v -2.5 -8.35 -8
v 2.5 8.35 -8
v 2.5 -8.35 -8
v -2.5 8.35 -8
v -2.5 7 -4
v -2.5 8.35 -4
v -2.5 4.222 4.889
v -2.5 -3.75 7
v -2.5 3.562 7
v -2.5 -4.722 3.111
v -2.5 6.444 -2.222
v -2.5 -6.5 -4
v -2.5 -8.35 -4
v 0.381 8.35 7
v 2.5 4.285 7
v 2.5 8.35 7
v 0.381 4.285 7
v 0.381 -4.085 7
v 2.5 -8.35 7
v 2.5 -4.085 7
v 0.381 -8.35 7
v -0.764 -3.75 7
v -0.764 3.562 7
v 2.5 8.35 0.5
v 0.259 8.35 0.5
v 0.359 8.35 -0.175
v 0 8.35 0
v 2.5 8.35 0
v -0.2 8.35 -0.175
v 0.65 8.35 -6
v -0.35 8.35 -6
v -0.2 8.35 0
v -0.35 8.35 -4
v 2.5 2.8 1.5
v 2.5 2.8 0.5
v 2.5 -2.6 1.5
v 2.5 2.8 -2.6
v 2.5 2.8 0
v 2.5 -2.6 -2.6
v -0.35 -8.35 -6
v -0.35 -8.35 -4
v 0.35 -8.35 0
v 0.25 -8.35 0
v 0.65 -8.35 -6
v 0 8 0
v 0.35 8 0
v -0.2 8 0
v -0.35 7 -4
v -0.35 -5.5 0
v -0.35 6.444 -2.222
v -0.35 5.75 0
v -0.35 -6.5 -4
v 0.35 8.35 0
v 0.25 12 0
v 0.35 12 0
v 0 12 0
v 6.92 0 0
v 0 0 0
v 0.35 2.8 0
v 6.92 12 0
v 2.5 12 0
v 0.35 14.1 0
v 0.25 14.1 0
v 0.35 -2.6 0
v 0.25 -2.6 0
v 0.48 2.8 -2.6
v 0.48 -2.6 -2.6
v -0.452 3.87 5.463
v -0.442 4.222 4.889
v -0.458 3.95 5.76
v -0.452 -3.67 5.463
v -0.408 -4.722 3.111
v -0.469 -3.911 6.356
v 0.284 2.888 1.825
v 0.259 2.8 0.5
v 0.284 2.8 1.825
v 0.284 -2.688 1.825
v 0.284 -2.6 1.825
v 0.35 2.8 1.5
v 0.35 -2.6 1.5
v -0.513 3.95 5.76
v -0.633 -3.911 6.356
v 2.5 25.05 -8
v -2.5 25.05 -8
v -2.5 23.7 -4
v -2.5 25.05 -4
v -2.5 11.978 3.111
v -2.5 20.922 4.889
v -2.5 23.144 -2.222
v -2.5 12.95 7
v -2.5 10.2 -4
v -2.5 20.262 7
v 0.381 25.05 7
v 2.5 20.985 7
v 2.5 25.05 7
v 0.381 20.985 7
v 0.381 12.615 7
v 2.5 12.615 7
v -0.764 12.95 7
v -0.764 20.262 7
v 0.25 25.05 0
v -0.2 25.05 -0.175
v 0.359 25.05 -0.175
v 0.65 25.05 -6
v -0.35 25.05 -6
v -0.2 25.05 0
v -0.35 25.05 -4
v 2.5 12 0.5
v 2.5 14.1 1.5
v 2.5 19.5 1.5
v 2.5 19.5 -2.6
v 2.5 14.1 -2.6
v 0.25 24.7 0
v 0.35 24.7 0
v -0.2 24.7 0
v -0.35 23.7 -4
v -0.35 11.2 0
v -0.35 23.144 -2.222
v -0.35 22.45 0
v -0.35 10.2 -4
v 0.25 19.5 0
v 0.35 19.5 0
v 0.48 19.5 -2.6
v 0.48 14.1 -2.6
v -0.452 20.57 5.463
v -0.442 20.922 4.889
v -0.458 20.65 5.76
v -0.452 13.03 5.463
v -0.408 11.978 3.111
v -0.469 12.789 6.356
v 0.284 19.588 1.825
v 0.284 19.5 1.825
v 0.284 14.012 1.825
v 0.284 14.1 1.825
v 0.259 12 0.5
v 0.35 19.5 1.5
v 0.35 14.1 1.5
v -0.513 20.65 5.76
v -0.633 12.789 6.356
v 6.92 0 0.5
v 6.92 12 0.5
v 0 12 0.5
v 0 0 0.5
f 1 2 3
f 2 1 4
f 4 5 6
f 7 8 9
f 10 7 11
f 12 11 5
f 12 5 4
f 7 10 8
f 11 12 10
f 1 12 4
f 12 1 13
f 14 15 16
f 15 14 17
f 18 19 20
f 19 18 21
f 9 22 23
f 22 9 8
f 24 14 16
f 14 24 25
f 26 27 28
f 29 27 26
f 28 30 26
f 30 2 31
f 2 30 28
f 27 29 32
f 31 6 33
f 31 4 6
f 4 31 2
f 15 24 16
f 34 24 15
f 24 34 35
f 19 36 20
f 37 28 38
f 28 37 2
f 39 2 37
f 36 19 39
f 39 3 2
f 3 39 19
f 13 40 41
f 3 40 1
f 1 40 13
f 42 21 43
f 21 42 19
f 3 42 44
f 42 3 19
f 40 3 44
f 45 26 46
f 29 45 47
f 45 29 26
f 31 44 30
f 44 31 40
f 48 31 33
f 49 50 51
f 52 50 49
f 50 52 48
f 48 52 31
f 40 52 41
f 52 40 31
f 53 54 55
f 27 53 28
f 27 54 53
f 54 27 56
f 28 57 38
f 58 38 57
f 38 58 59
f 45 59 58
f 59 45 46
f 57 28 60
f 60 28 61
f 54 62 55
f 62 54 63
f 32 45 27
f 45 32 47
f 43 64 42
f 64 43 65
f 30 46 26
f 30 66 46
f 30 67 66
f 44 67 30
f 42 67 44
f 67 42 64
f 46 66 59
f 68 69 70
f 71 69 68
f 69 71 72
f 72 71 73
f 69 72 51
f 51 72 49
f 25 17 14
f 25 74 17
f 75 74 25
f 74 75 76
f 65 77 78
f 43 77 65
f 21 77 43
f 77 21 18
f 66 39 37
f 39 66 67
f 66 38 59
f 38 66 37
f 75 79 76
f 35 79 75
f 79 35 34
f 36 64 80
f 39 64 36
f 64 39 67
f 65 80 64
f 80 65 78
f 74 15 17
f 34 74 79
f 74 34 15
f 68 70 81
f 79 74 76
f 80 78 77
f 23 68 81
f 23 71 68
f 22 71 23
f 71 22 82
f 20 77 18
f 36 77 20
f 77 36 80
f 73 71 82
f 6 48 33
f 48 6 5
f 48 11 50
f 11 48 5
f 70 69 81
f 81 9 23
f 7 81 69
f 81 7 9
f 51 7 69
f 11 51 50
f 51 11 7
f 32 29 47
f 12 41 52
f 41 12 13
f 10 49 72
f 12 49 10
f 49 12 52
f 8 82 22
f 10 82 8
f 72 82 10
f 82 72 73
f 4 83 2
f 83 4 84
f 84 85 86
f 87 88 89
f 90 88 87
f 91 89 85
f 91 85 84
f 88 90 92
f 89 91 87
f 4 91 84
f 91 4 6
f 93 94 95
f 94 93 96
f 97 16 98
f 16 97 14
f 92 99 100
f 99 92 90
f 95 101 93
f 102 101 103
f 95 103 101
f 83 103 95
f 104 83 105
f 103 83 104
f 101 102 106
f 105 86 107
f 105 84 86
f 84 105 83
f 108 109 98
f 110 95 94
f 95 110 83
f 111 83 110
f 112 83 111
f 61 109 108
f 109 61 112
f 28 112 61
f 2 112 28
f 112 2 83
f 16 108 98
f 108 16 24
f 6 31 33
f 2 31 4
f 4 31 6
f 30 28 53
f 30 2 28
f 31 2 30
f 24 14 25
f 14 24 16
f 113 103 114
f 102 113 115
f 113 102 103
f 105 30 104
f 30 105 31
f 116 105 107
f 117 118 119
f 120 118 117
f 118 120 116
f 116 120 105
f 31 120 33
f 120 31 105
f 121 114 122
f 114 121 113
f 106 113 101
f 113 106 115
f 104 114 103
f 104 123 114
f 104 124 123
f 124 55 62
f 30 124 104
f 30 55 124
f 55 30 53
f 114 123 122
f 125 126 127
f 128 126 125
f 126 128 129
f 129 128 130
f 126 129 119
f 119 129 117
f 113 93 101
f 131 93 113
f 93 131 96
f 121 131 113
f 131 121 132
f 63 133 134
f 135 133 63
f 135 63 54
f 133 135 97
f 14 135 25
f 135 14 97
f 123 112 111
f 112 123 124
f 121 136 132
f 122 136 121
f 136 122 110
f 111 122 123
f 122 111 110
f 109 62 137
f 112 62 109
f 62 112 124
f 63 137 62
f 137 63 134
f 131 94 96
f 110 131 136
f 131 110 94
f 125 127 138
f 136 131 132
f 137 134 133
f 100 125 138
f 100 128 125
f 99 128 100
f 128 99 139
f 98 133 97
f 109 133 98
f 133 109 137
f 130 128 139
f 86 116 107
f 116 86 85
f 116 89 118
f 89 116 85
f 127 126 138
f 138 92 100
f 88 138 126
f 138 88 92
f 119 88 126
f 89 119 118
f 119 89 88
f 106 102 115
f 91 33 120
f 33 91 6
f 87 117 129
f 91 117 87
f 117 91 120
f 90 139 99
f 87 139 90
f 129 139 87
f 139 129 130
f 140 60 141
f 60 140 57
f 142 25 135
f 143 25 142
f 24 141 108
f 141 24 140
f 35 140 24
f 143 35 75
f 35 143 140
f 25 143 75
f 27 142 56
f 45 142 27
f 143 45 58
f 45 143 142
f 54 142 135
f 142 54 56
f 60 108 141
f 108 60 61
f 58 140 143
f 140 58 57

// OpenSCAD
// file: LedStripLights5b.scad
// Lights5b
// Ferrules for 3 mm fiber optic sideglows

//p1=[ [0,0], [0,4], [0.5,5], [5.75,5], [5.85,4], [9.15,4], [9.25,5], [12,5], [27,3], [27,0] ];
p1=[ [0,0], [0,4], [0.5,6], [5.75,6], [5.85,5], [9.15,5], [9.25,6], [12,6], [27,3], [27,0] ];

module Ferrule1(){

difference(){
    rotate([0,-90,0])
    rotate_extrude($fn=6){
        rotate([0,0,-90])
        polygon(points=p1);
    }    
    
    color("cyan")
    rotate([0,90,0])
//    cylinder(r1=2.0,r2=1.8, h=50,$fn=6);
    cylinder(r1=1.8,r2=1.85, h=50,$fn=6);
}

}

//---------------------------------------------
// make a solid body version, ie no cut for the fiber
module Ferrule2(){

//difference(){
rotate([0,-90,0])
rotate_extrude($fn=6){
    rotate([0,0,-90])
    polygon(points=p1);
}    

}

//--------------------------------------------------------
// make a solid body version, scale the polygon, use this for making
// cuts into the Rx
module Ferrule3(){

rotate([0,-90,0])
rotate_extrude($fn=6){
    rotate([0,0,-90])
    scale(1.02)
    polygon(points=p1);
}    

}
//--------------------------------------------------------
// make a solid body version, scale the polygon, use this for making
// cuts into the lids only
module Ferrule4(){
/*
intersection(){
rotate([0,-90,0])
rotate_extrude($fn=6){
    rotate([0,0,-90])
    scale(1.02)
    polygon(points=p1);
}    
translate([8,-20,-10]) linear_extrude(height=20) square(40);
}
*/
translate([9,0,0])
color("green") rotate([0,90,0])
cylinder(r=6.1,h=8,$fn=6);

}

//============================


Ferrule1();


//translate([0,0,-13]) Ferrule4();

/*
color("cyan")
translate([-1,0,0])
rotate([0,90,0])
cylinder(r=1.5,h=40,$fn=30);

color("orange")
translate([0,0,13])
Ferrule2();

color("red")
translate([0,0,2*13])
Ferrule3();

color("pink")
intersection(){
    translate([0,0,3*13])
    difference(){
        Ferrule3();
        Ferrule2();
    }
    translate([-35,0,0])
    linear_extrude(heigth=100)
    square(100,center=true);
}

*/
// main file
// Lights5a
// headblock for leds, fibers insert with ferrules Lights4b part
// This is the reduced material, easy-insert version
use <LedStripLights5b.scad>

module Rx1(){
tol=0.20;
Off1 = 1.0;

difference(){
// Rx body
translate([-4,-8.35,-8]) color("cyan")
linear_extrude(height=15) square(size=[13,16.7]);

Ferrule3();

//===========
// lower cut for tape
translate([-1.85,-20,-6])
linear_extrude(height=6,scale=0.7) square(size=[0.5,40]);
// upper cut for tape    
translate([-1.85+0.1,0,0])
linear_extrude(height=8,scale=1.5) square(size=[0.2,40],center=true);

//-------
// cut for the chip head
color("red")
translate([-1.65,-2.5-tol/2-Off1,-2.5-tol/2])
linear_extrude(height=12) 
    square(size=[1.65+tol*2,5+tol*2]);

// cut to taper the chip insert
color("orange")
translate([-1.65/2+tol,-Off1+tol/2,+1.5])
linear_extrude(height=8,scale=2) 
    square(size=[1.65+tol*2,5+tol*2],center=true);


// cuts on the backside 
color("yellow")
translate([-1.7,10,-4])
rotate([0,0,180])
linear_extrude(height=16,scale=[1,2]) 
    square(size=[2.5,5]);

color("gray")
translate([-4, -10.5,-4])
linear_extrude(height=16,scale=[1,2]) 
    square(size=[2.25,4]);

// sidewall cuts
translate([-1.7,2.5,4])
linear_extrude(height=4,scale=[4.5,1])
square(size=[2,8]);
translate([-1.7,-9,4])
linear_extrude(height=4,scale=[4.5,1])
square(size=[2,8]);

// cut for the ferrule head
translate([3,0,-3]) color("pink")
linear_extrude(height=12) square(size=[6,12*0.866],center=true);

// cut for the ferrule neck
translate([7,0,0]) color("green")
linear_extrude(height=10,scale=1.2) square(size=[6,8.66],center=true);

// cut for extra clearance at the bottom of the well
translate([0,0,-4.5]) color("orange")
rotate([0,90,0]) 
cylinder(r=1.5,h=12,$fn=16);

/*
// thru hole where the fiber would sit
// allows running a wire out the port if there is 
// not a led installed there
translate([-4,0,0]) color("orange")
rotate([0,90,0]) 
cylinder(r=1.5,h=2.2,$fn=16);
*/

}  // end of difference

} // end of module


//=================
// Simpler block model, use for cutting lids
module Rx2(){
    
tol=0.20;
Off1 = 1.0;

// Rx body
translate([-4,-8.35,-8]) color("cyan")
linear_extrude(height=15) square(size=[13,16.7]);

Ferrule4();

} // end of module

//-------------------------------------------------------------------------
module Rx3(){
tol=0.20;
Off1 = 0;

translate([1.5,0,0]){
difference(){
// Rx body
translate([-4,-8.35,-8]) color("cyan")
linear_extrude(height=15) square(size=[5,16.7]);

// lower cut for tape
translate([-1.85,-20,-6])
linear_extrude(height=6,scale=0.7) square(size=[1,40]);

// upper cut for tape    
translate([-1.85+0.3,0,0])
linear_extrude(height=8,scale=1.5) square(size=[0.6,40],center=true);

// cut for the chip head
color("red")
translate([-1.65,-2.5-tol/2-Off1,-2.5-tol/2])
linear_extrude(height=12) 
    square(size=[1.65+tol*2+1,5+tol*2]);

// cut to taper the chip insert
color("orange")
translate([-1.65/2+1.5+tol,-Off1+tol/2,+1.5])
linear_extrude(height=8,scale=1.8) 
    square(size=[1.65+2+tol*2,5+tol*2],center=true);


// cuts on the backside 
color("yellow")
translate([-1.7,12,-4])
rotate([0,0,180])
linear_extrude(height=16,scale=[1,2]) 
    square(size=[2.5,5]);

color("gray")
translate([-4.01, -10.5,-4])
linear_extrude(height=16,scale=[1,2]) 
    square(size=[2.25,4]);

/*
// thru hole where the fiber would sit
// allows running a wire out the port if there is 
// not a led installed there
translate([-4,0,0]) color("orange")
rotate([0,90,0]) 
cylinder(r=1.5,h=2.2,$fn=16);
*/

}  // end of difference

}
} // end of module



//-------------------------------------------------------------------------
// dense strip leds
module strip2(){

x0=6.92;    // spacing of leds along tape
y0=12;      // width of tape
z0=0.5;     // thickness of tape

    // tape
    cube([x0,y0,z0]);
    
}

//==================================

strip2();

Rx3();
translate([0,16.7,0])
Rx3();

/*
translate([0,0,20])
Rx2();
*/
